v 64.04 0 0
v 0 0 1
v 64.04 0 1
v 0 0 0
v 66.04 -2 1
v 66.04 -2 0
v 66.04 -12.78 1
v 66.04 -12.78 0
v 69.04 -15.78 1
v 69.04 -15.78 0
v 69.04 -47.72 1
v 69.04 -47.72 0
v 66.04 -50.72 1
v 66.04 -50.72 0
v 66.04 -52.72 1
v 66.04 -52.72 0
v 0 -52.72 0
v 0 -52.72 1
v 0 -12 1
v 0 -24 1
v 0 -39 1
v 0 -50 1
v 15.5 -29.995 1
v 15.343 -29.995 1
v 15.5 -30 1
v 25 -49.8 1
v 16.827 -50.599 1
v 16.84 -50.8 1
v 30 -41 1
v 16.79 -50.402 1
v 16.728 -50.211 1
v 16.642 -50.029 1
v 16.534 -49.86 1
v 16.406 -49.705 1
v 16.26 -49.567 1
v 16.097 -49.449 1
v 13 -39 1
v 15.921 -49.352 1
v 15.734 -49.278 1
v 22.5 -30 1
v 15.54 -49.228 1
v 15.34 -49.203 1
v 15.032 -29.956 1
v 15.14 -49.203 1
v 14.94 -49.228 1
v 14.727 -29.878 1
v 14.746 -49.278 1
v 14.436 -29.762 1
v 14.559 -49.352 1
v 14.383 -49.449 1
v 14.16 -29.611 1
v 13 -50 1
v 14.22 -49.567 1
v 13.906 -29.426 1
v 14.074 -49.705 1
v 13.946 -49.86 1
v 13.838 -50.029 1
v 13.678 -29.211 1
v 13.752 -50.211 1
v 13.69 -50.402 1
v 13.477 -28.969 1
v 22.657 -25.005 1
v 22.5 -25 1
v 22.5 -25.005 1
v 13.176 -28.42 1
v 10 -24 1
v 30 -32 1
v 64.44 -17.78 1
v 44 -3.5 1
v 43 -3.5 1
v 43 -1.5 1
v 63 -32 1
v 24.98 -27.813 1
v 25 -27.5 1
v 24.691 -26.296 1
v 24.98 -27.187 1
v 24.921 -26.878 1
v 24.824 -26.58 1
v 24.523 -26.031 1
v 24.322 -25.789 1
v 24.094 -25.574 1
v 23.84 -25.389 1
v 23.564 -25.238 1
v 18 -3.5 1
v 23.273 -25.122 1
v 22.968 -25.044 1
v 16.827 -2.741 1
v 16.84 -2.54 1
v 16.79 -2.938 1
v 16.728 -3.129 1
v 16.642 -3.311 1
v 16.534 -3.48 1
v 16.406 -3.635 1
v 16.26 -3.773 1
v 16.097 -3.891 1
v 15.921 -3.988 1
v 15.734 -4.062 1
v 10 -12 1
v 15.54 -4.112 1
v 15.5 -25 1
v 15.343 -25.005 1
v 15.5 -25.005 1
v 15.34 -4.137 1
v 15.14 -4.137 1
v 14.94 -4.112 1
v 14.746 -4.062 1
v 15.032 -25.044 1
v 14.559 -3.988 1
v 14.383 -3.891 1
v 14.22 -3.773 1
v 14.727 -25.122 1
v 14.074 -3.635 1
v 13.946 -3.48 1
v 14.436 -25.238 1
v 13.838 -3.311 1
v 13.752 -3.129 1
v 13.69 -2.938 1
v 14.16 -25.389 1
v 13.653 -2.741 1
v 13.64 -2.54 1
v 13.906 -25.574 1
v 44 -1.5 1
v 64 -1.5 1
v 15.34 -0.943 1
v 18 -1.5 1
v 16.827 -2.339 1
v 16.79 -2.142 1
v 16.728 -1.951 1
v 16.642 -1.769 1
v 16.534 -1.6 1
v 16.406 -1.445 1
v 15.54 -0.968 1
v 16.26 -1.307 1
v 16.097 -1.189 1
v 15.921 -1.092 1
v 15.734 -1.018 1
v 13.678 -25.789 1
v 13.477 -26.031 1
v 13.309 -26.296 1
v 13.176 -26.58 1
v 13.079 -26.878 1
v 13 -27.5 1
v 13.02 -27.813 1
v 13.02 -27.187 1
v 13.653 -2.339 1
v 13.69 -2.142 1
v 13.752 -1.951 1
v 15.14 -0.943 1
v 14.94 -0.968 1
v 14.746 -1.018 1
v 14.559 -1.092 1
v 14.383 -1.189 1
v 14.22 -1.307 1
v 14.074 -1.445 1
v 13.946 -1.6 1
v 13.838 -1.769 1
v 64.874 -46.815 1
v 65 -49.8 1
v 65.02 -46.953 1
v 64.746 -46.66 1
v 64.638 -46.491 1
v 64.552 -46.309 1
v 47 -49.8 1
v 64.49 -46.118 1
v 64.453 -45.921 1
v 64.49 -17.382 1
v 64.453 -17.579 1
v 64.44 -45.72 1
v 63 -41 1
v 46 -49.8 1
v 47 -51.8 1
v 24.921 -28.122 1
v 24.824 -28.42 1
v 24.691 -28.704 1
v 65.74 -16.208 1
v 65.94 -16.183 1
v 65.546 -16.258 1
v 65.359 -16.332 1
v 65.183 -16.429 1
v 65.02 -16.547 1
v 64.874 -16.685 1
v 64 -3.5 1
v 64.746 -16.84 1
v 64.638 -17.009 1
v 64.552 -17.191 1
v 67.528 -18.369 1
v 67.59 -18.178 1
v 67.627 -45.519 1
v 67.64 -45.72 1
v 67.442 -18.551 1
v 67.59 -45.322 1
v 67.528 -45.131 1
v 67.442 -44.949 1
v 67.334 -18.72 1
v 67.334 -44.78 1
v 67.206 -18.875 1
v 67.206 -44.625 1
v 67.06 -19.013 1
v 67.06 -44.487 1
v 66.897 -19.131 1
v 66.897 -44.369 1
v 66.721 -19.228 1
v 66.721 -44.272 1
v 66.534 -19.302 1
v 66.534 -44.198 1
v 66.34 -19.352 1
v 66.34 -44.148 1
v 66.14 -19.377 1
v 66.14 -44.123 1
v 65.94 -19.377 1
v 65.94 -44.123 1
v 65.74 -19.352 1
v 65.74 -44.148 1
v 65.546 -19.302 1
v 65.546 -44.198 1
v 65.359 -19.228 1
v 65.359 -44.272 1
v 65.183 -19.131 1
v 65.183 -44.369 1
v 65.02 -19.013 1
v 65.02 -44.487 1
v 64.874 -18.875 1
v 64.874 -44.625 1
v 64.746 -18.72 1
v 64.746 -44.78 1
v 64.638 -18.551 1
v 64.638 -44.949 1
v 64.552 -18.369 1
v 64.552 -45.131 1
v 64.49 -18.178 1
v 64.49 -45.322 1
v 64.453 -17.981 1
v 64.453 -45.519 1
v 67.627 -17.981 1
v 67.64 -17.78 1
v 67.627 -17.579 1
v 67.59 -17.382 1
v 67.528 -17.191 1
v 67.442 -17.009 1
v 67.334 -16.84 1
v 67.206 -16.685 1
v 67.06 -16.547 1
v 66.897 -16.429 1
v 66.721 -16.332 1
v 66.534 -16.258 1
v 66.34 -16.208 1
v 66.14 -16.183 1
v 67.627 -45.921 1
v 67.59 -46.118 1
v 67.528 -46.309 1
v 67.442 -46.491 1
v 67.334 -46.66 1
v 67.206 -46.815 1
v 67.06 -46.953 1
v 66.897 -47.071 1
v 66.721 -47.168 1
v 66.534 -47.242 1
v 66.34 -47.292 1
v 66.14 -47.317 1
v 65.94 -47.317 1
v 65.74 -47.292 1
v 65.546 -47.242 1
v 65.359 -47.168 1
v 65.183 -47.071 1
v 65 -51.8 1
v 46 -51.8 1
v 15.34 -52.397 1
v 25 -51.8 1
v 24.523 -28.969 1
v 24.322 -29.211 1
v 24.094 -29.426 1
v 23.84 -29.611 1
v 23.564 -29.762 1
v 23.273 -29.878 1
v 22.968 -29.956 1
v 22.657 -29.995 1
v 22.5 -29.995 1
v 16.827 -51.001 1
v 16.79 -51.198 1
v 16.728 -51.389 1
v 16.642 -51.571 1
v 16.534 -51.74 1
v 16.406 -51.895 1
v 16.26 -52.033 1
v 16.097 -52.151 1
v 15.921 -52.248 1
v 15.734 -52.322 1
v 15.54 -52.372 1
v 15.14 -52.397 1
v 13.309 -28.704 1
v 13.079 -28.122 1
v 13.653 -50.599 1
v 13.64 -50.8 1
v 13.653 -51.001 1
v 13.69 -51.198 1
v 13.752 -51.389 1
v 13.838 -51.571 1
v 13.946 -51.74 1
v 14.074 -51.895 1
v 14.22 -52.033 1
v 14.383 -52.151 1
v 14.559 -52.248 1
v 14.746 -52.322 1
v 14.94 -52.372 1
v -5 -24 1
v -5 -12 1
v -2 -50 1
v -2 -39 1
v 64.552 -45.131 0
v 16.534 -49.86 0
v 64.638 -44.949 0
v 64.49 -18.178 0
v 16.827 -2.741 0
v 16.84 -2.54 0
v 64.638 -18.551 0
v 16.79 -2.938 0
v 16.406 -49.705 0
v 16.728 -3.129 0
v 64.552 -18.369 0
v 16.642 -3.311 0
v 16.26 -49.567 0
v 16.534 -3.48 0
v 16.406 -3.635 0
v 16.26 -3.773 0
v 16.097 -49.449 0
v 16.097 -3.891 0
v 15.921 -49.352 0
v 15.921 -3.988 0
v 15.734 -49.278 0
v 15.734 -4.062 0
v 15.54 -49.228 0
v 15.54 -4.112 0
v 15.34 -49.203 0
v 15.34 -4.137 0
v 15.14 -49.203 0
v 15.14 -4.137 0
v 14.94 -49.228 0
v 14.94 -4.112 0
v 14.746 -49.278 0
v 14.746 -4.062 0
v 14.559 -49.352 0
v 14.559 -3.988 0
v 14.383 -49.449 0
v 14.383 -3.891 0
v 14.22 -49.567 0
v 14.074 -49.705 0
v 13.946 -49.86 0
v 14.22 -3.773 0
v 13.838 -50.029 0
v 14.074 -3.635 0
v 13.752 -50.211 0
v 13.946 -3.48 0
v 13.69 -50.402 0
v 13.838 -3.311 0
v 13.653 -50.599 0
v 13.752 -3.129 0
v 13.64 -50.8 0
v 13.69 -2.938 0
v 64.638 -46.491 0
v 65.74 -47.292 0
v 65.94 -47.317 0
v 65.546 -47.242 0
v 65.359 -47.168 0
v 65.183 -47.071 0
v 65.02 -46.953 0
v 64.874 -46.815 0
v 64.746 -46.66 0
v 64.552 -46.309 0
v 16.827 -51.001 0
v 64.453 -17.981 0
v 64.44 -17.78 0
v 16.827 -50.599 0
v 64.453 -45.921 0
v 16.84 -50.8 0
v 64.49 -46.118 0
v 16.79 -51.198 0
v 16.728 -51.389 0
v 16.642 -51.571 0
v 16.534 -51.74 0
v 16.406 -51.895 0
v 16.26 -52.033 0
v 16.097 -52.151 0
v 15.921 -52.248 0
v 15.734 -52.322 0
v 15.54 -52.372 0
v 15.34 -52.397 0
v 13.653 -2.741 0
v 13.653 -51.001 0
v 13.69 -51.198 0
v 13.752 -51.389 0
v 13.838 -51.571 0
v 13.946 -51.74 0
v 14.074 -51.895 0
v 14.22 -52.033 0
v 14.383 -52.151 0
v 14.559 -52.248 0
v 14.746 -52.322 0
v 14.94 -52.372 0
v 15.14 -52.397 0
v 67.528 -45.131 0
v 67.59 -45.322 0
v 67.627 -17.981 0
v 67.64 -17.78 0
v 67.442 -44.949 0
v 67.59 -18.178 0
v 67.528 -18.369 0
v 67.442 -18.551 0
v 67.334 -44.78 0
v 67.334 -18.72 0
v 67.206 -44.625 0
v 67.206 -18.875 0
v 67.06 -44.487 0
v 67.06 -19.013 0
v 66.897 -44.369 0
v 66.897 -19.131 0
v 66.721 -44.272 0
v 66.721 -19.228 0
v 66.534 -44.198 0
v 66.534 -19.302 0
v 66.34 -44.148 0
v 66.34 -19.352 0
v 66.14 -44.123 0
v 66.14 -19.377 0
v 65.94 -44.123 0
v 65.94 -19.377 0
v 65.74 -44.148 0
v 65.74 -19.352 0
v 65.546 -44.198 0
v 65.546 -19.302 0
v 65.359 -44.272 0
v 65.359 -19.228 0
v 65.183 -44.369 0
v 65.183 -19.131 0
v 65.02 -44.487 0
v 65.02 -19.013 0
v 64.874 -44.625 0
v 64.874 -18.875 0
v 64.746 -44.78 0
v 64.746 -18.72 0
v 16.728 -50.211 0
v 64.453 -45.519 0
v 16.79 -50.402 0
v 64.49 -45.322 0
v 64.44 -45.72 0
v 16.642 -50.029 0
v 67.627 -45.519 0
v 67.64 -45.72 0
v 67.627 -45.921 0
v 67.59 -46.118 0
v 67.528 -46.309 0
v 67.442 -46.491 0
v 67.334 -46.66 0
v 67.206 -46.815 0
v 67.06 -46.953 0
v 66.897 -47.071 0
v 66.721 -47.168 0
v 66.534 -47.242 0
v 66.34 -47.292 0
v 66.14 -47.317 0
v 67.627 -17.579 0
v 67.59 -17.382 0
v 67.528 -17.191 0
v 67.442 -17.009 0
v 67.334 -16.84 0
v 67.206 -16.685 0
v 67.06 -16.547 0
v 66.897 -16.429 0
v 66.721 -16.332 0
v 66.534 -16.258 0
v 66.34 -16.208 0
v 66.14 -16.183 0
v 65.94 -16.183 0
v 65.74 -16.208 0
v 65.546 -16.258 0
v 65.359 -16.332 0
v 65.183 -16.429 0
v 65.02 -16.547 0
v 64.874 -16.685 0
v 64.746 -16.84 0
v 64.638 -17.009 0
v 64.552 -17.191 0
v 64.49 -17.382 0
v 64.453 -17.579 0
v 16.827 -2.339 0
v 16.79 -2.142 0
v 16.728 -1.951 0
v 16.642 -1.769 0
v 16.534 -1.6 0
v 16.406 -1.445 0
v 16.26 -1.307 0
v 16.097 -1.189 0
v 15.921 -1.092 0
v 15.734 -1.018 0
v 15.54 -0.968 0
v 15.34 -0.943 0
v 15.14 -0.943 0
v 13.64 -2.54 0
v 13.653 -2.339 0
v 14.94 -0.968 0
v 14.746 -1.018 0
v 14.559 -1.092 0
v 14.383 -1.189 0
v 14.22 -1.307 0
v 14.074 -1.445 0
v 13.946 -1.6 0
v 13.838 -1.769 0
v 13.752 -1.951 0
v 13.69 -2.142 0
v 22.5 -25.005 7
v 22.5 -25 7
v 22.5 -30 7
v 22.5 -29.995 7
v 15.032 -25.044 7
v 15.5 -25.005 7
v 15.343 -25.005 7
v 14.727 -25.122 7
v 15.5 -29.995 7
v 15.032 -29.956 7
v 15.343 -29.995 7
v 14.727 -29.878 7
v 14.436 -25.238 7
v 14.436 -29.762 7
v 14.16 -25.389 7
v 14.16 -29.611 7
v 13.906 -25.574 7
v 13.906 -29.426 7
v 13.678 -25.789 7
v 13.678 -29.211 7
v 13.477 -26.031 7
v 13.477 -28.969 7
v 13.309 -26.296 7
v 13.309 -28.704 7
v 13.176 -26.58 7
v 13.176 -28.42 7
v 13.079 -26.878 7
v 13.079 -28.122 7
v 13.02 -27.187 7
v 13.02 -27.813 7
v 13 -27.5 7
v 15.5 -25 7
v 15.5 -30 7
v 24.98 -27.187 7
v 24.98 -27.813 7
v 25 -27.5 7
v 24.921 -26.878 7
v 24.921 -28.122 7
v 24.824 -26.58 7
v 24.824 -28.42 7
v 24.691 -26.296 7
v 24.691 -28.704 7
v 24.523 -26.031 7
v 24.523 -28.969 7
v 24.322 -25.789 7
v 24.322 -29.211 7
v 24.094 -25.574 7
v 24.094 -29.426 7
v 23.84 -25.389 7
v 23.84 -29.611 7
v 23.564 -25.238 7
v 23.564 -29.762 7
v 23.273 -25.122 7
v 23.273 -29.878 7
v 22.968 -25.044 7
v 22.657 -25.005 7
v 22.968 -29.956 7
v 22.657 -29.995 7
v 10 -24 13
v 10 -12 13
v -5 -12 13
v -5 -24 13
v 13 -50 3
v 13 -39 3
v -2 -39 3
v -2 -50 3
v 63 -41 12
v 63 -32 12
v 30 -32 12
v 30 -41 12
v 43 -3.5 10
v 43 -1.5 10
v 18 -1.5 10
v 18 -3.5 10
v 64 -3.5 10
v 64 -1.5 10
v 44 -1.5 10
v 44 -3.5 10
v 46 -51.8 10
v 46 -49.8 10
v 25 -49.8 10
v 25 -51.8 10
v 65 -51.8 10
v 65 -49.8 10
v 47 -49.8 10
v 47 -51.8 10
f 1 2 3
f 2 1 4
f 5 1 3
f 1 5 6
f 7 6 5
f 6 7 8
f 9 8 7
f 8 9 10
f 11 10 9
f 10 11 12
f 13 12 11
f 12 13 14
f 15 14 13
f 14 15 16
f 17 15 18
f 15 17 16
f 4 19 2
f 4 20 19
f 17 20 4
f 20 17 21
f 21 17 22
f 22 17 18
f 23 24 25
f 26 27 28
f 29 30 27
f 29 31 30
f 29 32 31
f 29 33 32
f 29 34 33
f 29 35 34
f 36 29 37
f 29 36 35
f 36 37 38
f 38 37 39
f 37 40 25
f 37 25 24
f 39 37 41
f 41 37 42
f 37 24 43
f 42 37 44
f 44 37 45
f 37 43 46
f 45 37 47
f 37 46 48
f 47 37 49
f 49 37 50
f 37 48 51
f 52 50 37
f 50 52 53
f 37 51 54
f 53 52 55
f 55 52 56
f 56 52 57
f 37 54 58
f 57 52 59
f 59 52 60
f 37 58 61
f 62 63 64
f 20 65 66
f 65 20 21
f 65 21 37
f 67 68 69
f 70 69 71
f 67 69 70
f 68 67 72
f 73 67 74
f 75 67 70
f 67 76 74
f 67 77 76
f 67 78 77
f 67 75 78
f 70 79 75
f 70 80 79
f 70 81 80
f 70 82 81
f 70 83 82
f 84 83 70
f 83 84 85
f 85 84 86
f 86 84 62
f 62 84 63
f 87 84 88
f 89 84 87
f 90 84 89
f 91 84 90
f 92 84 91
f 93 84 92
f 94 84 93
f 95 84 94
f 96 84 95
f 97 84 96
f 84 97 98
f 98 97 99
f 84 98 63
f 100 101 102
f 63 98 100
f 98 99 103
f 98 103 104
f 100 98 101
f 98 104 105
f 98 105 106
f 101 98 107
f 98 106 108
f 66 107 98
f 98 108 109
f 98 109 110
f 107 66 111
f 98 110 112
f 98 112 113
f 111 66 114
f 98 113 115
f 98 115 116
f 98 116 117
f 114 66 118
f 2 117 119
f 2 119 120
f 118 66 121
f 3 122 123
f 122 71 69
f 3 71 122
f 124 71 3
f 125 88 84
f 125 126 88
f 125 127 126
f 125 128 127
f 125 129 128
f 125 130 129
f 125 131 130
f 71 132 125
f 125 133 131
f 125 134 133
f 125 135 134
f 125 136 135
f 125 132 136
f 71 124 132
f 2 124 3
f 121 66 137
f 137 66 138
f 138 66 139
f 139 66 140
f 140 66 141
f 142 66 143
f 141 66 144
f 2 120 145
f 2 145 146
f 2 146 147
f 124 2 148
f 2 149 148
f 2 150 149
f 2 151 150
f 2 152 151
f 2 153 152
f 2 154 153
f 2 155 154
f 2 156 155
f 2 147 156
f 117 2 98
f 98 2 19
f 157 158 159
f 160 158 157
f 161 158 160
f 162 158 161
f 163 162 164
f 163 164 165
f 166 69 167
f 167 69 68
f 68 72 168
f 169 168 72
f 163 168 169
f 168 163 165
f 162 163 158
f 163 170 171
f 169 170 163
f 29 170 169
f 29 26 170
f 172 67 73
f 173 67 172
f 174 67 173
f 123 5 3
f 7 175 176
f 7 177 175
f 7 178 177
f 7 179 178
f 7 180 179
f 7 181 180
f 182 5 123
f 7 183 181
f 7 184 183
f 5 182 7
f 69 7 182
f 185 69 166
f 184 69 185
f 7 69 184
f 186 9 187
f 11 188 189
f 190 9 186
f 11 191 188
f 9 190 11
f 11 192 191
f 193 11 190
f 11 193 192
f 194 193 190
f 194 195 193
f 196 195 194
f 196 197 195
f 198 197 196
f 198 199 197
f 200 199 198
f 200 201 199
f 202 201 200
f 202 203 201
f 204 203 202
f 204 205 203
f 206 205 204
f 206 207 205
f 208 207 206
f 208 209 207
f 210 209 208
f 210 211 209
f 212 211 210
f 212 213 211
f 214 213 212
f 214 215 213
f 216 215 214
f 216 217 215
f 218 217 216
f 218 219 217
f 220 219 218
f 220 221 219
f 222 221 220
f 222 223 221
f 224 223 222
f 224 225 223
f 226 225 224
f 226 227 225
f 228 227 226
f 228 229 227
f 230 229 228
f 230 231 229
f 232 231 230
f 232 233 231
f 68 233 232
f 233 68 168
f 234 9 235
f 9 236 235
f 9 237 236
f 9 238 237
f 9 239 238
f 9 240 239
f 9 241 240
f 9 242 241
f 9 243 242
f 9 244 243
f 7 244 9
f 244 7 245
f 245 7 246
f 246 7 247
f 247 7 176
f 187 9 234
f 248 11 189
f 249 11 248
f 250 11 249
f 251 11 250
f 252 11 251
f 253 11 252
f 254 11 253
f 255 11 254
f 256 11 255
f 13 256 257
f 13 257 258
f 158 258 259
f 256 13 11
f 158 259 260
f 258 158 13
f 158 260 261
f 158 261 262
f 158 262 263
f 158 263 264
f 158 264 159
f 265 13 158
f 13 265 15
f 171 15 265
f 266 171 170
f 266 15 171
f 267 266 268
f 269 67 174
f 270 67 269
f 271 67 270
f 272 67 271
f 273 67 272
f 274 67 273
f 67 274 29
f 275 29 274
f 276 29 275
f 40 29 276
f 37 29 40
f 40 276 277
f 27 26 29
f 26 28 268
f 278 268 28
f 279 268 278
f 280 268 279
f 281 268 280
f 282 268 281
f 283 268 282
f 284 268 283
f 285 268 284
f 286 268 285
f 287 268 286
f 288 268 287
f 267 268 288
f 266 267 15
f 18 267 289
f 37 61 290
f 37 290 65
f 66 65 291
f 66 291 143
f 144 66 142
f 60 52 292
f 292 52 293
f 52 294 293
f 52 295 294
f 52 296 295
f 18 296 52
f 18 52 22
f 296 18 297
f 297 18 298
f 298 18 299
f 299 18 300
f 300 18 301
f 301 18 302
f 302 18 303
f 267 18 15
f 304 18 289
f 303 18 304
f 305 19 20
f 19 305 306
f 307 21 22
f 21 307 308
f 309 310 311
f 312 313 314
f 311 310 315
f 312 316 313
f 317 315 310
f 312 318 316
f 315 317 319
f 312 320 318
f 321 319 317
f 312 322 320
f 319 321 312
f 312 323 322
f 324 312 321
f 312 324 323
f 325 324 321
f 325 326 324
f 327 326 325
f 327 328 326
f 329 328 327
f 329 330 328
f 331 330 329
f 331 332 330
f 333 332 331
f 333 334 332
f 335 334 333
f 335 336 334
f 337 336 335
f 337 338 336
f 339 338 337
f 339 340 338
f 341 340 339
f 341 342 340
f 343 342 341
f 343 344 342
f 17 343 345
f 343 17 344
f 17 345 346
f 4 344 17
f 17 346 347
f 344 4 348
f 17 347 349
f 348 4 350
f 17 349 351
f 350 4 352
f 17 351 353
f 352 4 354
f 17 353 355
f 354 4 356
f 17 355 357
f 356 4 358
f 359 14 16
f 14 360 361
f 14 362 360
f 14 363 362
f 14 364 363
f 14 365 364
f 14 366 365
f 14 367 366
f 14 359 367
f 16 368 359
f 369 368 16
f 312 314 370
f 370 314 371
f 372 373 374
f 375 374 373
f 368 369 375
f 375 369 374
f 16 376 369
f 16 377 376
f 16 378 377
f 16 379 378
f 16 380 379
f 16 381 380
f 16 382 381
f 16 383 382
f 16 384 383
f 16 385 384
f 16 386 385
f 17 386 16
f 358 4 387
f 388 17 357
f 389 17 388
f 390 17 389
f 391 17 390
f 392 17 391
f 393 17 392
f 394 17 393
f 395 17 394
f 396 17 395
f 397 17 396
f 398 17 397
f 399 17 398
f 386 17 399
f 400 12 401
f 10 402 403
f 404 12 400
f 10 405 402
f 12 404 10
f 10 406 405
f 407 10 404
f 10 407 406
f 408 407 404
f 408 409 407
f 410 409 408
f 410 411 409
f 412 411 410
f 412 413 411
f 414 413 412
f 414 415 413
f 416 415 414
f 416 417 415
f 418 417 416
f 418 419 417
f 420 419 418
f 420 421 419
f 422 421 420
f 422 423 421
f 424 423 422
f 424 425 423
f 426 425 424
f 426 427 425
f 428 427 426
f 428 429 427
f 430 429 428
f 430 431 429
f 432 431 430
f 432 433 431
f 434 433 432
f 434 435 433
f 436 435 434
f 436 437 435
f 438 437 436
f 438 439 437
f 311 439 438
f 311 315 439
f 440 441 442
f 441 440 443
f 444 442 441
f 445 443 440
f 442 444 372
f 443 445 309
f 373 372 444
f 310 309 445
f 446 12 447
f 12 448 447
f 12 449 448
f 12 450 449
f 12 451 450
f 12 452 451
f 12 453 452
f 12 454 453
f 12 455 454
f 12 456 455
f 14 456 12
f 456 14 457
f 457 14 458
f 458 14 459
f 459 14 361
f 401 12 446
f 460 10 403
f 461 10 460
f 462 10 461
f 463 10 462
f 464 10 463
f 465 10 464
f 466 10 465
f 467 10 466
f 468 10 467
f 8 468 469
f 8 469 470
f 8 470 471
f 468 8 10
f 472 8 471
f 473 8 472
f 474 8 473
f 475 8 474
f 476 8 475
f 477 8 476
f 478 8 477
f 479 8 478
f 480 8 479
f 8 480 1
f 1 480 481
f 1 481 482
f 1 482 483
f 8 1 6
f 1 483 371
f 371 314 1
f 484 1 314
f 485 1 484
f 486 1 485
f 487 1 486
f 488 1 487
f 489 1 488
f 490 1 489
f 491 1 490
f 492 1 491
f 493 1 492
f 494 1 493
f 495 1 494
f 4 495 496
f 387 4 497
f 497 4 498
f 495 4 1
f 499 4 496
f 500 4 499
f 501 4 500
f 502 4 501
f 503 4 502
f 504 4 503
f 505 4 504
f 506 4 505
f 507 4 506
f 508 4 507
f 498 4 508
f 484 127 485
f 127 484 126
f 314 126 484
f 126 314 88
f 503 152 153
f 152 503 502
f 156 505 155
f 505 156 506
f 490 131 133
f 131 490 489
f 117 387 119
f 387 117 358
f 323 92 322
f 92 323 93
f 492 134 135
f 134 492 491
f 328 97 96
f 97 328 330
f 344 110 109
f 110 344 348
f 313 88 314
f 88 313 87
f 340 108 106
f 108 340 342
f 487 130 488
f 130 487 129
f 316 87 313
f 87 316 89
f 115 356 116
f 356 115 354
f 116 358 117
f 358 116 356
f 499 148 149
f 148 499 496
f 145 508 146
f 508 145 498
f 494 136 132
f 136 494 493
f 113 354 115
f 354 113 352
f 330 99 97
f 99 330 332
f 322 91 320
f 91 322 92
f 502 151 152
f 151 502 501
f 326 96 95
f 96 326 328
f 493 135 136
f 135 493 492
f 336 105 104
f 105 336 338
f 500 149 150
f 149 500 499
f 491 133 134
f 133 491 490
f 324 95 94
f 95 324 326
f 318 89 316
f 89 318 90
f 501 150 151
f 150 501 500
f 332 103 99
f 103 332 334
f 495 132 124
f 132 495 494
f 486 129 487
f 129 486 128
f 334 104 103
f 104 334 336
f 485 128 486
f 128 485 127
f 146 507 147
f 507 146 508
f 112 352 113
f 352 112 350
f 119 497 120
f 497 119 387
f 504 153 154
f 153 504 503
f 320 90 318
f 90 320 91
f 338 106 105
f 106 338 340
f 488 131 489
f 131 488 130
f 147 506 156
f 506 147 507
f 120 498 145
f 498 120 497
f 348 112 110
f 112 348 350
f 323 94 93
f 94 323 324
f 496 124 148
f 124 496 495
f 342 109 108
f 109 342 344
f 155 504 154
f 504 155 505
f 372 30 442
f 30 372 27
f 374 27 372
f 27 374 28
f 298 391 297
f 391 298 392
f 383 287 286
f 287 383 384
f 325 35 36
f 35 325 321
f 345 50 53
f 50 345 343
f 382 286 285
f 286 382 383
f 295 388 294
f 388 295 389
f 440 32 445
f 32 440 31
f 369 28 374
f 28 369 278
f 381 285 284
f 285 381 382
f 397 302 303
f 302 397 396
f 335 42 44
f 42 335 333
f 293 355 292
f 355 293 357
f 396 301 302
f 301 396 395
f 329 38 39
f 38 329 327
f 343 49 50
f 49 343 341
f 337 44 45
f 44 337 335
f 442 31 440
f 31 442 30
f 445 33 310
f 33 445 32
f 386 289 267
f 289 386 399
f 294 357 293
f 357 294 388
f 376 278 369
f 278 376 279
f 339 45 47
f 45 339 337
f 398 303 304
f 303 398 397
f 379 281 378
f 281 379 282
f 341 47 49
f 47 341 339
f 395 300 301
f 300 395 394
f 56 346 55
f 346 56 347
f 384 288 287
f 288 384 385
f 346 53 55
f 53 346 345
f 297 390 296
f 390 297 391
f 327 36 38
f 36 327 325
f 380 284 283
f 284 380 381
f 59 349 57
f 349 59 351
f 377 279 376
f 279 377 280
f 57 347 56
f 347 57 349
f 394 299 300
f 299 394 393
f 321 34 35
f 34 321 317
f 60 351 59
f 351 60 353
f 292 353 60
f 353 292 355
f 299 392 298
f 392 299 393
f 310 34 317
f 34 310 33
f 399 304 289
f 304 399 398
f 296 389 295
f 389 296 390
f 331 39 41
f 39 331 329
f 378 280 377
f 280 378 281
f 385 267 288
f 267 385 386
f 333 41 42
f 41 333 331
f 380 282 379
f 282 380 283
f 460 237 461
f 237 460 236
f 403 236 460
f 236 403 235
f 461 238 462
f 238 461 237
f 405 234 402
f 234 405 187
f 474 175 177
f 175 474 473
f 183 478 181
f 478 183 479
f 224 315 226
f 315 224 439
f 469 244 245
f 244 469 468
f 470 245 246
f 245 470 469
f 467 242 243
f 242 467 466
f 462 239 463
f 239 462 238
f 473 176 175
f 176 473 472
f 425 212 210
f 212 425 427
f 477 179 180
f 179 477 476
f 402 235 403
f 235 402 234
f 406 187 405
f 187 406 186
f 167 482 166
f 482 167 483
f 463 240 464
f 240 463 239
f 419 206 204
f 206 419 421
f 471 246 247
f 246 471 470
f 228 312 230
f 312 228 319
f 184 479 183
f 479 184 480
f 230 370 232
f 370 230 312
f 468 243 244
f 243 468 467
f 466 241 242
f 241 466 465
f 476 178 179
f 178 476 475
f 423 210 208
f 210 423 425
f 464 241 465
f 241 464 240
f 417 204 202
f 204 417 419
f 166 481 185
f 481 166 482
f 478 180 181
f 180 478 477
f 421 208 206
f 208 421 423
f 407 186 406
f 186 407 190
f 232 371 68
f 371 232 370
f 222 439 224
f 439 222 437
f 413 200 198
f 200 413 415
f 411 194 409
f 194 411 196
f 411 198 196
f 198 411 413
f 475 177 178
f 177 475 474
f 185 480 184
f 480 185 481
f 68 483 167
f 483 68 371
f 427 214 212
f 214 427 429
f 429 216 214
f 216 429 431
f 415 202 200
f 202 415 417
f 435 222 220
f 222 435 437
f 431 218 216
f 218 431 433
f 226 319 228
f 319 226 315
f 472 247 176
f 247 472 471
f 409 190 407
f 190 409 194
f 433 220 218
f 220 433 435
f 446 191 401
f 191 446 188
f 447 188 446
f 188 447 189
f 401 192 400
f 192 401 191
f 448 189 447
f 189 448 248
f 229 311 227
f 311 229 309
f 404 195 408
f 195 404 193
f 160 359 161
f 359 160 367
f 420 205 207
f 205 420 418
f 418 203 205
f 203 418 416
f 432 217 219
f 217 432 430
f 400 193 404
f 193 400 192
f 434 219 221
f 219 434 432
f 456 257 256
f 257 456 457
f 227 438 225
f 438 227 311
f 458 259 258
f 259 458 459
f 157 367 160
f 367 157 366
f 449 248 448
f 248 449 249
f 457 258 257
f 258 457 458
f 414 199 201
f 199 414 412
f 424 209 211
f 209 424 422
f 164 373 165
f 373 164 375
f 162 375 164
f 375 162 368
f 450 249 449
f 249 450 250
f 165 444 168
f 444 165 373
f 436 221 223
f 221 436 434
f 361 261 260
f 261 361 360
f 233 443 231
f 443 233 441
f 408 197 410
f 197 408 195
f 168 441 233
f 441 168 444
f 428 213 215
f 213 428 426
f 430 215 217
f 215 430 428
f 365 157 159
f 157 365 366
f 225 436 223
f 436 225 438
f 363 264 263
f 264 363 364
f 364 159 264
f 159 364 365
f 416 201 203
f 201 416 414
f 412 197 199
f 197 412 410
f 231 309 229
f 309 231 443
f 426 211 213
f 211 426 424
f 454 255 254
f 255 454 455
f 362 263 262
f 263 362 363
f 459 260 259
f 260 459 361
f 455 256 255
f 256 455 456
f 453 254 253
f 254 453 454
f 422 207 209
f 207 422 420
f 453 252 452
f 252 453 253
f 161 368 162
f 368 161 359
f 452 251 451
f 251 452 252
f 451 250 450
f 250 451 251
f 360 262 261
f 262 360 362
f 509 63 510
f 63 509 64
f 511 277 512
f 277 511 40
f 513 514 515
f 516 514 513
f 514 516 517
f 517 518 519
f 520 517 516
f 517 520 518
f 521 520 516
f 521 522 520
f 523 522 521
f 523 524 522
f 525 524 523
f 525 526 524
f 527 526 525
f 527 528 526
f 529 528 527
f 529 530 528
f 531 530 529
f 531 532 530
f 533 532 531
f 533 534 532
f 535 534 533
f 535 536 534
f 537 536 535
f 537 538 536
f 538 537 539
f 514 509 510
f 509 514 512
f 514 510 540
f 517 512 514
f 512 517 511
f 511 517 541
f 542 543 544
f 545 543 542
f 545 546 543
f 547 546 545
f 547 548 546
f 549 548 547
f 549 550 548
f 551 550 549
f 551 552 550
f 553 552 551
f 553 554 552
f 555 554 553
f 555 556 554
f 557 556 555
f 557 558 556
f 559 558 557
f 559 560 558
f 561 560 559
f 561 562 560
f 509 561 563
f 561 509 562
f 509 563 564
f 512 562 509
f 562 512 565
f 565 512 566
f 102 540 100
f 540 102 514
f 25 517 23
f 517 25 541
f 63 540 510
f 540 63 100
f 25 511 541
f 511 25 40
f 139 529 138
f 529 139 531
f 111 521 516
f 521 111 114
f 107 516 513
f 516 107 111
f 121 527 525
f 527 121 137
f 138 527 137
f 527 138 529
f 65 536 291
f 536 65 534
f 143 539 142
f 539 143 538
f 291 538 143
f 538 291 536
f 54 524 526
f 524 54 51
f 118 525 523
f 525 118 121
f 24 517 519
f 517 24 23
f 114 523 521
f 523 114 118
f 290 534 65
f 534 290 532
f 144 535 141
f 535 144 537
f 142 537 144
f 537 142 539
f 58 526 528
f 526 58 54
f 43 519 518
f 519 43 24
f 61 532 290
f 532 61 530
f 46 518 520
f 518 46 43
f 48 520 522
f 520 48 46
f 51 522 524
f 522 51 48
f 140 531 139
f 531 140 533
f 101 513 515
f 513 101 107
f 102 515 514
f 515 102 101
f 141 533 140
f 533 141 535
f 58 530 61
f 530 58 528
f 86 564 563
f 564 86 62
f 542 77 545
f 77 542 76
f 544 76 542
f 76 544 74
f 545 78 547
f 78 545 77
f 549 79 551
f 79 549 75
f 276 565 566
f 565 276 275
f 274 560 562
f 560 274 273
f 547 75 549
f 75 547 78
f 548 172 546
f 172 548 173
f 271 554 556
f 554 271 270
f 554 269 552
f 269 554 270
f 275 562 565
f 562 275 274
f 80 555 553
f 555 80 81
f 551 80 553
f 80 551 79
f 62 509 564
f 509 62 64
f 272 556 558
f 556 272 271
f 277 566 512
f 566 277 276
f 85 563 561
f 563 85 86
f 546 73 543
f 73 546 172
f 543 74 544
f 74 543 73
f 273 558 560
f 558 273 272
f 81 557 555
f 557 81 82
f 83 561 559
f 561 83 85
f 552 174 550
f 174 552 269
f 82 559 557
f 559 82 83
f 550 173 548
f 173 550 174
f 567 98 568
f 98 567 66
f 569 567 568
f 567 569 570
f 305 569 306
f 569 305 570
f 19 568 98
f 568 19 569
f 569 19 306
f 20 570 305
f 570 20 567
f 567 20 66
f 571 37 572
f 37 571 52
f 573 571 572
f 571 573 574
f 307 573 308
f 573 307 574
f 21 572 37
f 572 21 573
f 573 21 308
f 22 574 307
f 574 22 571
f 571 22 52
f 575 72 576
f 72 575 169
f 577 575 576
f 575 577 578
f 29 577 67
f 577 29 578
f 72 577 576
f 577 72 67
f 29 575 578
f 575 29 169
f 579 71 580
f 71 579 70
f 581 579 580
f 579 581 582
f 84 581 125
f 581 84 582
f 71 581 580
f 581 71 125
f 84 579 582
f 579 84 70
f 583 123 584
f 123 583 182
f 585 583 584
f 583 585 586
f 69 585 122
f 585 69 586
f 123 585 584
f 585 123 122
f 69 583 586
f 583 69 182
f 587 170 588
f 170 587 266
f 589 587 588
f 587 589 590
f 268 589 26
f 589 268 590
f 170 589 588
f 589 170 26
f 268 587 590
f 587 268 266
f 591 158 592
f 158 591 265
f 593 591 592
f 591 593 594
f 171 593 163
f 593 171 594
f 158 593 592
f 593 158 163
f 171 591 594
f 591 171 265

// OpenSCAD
module arduino_uno(){
    color("blue")
    difference() {
        polyhedron(
            points=[
                [    0  ,               0, 0], //  0
                [66.04-2,               0, 0], //  1
                [66.04  ,              -2, 0], //  2
                [66.04  ,    -(17.78-2-3), 0], //  3
                [69.04  ,    -(17.78-2  ), 0], //  4
                [66.04+3,  -(45.72+2    ), 0], //  5
                [66.04  ,  -(45.72+2+3  ), 0], //  6
                [66.04  ,  -(45.72+2+3+2), 0], //  7
                [    0  ,  -(45.72+2+3+2), 0], //  8

                [    0  ,               0, 1], //  9
                [66.04-2,               0, 1], // 10
                [66.04  ,              -2, 1], // 11
                [66.04  ,    -(17.78-2-3), 1], // 12
                [69.04  ,    -(17.78-2  ), 1], // 13
                [66.04+3,  -(45.72+2    ), 1], // 14
                [66.04  ,  -(45.72+2+3  ), 1], // 15
                [66.04  ,  -(45.72+2+3+2), 1], // 16
                [    0  ,  -(45.72+2+3+2), 1], // 17
            ],
            faces=[
                [9,0,1,10],
                [10,1,2,11],
                [11,2,3,12],
                [12,3,4,13],
                [13,4,5,14],
                [14,5,6,15],
                [15,6,7,16],
                [16,7,8,17],
                [17,8,0,9],
                [9,10,11,12,13,14,15,16,17],
                [0,8,7,6,5,4,3,2,1]
            ],
            convexity=5
        );
        translate([15.24, -2.54,-1]) cylinder(d=3.2, h=10, $fn=50);
        translate([15.24,-50.8 ,-1]) cylinder(d=3.2, h=10, $fn=50);
        translate([66.04,-17.78,-1]) cylinder(d=3.2, h=10, $fn=50);
        translate([66.04,-45.72,-1]) cylinder(d=3.2, h=10, $fn=50);
    }
    // USB
    color("grey")
    translate([-5,-12*2,1])
    cube(size=[15, 12, 12]);
    // SD
    color("grey")
    translate([-2,-(50),1])
    cube(size=[15, 11, 2]);
    // Crystal
    color("grey")
    translate([13,-30,1])
    union() {
        longueur = 12;
        largeur  = 5;
        hauteur  = 6;
        translate([largeur/2,0,0]) cube(size=[longueur-largeur,largeur,hauteur]);
        translate([largeur/2,largeur/2,0]) cylinder(d=largeur,h=hauteur, $fn=50);
        translate([longueur-largeur/2,largeur/2,0]) cylinder(d=largeur,h=hauteur, $fn=50);
    }
    // ATMega
    color("black")
    translate([30,-41,0]) 
    cube(size=[33,9,12]);

    // Pins
    color("black")
    translate([18,-3.5,0])
    cube(size=[25,2,10]);

    color("black")
    translate([44,-3.5,0])
    cube(size=[20,2,10]);

    color("black")
    translate([25,-51.8,0])
    cube(size=[21,2,10]);

    color("black")
    translate([47,-51.8,0])
    cube(size=[18,2,10]);
}

arduino_uno();
